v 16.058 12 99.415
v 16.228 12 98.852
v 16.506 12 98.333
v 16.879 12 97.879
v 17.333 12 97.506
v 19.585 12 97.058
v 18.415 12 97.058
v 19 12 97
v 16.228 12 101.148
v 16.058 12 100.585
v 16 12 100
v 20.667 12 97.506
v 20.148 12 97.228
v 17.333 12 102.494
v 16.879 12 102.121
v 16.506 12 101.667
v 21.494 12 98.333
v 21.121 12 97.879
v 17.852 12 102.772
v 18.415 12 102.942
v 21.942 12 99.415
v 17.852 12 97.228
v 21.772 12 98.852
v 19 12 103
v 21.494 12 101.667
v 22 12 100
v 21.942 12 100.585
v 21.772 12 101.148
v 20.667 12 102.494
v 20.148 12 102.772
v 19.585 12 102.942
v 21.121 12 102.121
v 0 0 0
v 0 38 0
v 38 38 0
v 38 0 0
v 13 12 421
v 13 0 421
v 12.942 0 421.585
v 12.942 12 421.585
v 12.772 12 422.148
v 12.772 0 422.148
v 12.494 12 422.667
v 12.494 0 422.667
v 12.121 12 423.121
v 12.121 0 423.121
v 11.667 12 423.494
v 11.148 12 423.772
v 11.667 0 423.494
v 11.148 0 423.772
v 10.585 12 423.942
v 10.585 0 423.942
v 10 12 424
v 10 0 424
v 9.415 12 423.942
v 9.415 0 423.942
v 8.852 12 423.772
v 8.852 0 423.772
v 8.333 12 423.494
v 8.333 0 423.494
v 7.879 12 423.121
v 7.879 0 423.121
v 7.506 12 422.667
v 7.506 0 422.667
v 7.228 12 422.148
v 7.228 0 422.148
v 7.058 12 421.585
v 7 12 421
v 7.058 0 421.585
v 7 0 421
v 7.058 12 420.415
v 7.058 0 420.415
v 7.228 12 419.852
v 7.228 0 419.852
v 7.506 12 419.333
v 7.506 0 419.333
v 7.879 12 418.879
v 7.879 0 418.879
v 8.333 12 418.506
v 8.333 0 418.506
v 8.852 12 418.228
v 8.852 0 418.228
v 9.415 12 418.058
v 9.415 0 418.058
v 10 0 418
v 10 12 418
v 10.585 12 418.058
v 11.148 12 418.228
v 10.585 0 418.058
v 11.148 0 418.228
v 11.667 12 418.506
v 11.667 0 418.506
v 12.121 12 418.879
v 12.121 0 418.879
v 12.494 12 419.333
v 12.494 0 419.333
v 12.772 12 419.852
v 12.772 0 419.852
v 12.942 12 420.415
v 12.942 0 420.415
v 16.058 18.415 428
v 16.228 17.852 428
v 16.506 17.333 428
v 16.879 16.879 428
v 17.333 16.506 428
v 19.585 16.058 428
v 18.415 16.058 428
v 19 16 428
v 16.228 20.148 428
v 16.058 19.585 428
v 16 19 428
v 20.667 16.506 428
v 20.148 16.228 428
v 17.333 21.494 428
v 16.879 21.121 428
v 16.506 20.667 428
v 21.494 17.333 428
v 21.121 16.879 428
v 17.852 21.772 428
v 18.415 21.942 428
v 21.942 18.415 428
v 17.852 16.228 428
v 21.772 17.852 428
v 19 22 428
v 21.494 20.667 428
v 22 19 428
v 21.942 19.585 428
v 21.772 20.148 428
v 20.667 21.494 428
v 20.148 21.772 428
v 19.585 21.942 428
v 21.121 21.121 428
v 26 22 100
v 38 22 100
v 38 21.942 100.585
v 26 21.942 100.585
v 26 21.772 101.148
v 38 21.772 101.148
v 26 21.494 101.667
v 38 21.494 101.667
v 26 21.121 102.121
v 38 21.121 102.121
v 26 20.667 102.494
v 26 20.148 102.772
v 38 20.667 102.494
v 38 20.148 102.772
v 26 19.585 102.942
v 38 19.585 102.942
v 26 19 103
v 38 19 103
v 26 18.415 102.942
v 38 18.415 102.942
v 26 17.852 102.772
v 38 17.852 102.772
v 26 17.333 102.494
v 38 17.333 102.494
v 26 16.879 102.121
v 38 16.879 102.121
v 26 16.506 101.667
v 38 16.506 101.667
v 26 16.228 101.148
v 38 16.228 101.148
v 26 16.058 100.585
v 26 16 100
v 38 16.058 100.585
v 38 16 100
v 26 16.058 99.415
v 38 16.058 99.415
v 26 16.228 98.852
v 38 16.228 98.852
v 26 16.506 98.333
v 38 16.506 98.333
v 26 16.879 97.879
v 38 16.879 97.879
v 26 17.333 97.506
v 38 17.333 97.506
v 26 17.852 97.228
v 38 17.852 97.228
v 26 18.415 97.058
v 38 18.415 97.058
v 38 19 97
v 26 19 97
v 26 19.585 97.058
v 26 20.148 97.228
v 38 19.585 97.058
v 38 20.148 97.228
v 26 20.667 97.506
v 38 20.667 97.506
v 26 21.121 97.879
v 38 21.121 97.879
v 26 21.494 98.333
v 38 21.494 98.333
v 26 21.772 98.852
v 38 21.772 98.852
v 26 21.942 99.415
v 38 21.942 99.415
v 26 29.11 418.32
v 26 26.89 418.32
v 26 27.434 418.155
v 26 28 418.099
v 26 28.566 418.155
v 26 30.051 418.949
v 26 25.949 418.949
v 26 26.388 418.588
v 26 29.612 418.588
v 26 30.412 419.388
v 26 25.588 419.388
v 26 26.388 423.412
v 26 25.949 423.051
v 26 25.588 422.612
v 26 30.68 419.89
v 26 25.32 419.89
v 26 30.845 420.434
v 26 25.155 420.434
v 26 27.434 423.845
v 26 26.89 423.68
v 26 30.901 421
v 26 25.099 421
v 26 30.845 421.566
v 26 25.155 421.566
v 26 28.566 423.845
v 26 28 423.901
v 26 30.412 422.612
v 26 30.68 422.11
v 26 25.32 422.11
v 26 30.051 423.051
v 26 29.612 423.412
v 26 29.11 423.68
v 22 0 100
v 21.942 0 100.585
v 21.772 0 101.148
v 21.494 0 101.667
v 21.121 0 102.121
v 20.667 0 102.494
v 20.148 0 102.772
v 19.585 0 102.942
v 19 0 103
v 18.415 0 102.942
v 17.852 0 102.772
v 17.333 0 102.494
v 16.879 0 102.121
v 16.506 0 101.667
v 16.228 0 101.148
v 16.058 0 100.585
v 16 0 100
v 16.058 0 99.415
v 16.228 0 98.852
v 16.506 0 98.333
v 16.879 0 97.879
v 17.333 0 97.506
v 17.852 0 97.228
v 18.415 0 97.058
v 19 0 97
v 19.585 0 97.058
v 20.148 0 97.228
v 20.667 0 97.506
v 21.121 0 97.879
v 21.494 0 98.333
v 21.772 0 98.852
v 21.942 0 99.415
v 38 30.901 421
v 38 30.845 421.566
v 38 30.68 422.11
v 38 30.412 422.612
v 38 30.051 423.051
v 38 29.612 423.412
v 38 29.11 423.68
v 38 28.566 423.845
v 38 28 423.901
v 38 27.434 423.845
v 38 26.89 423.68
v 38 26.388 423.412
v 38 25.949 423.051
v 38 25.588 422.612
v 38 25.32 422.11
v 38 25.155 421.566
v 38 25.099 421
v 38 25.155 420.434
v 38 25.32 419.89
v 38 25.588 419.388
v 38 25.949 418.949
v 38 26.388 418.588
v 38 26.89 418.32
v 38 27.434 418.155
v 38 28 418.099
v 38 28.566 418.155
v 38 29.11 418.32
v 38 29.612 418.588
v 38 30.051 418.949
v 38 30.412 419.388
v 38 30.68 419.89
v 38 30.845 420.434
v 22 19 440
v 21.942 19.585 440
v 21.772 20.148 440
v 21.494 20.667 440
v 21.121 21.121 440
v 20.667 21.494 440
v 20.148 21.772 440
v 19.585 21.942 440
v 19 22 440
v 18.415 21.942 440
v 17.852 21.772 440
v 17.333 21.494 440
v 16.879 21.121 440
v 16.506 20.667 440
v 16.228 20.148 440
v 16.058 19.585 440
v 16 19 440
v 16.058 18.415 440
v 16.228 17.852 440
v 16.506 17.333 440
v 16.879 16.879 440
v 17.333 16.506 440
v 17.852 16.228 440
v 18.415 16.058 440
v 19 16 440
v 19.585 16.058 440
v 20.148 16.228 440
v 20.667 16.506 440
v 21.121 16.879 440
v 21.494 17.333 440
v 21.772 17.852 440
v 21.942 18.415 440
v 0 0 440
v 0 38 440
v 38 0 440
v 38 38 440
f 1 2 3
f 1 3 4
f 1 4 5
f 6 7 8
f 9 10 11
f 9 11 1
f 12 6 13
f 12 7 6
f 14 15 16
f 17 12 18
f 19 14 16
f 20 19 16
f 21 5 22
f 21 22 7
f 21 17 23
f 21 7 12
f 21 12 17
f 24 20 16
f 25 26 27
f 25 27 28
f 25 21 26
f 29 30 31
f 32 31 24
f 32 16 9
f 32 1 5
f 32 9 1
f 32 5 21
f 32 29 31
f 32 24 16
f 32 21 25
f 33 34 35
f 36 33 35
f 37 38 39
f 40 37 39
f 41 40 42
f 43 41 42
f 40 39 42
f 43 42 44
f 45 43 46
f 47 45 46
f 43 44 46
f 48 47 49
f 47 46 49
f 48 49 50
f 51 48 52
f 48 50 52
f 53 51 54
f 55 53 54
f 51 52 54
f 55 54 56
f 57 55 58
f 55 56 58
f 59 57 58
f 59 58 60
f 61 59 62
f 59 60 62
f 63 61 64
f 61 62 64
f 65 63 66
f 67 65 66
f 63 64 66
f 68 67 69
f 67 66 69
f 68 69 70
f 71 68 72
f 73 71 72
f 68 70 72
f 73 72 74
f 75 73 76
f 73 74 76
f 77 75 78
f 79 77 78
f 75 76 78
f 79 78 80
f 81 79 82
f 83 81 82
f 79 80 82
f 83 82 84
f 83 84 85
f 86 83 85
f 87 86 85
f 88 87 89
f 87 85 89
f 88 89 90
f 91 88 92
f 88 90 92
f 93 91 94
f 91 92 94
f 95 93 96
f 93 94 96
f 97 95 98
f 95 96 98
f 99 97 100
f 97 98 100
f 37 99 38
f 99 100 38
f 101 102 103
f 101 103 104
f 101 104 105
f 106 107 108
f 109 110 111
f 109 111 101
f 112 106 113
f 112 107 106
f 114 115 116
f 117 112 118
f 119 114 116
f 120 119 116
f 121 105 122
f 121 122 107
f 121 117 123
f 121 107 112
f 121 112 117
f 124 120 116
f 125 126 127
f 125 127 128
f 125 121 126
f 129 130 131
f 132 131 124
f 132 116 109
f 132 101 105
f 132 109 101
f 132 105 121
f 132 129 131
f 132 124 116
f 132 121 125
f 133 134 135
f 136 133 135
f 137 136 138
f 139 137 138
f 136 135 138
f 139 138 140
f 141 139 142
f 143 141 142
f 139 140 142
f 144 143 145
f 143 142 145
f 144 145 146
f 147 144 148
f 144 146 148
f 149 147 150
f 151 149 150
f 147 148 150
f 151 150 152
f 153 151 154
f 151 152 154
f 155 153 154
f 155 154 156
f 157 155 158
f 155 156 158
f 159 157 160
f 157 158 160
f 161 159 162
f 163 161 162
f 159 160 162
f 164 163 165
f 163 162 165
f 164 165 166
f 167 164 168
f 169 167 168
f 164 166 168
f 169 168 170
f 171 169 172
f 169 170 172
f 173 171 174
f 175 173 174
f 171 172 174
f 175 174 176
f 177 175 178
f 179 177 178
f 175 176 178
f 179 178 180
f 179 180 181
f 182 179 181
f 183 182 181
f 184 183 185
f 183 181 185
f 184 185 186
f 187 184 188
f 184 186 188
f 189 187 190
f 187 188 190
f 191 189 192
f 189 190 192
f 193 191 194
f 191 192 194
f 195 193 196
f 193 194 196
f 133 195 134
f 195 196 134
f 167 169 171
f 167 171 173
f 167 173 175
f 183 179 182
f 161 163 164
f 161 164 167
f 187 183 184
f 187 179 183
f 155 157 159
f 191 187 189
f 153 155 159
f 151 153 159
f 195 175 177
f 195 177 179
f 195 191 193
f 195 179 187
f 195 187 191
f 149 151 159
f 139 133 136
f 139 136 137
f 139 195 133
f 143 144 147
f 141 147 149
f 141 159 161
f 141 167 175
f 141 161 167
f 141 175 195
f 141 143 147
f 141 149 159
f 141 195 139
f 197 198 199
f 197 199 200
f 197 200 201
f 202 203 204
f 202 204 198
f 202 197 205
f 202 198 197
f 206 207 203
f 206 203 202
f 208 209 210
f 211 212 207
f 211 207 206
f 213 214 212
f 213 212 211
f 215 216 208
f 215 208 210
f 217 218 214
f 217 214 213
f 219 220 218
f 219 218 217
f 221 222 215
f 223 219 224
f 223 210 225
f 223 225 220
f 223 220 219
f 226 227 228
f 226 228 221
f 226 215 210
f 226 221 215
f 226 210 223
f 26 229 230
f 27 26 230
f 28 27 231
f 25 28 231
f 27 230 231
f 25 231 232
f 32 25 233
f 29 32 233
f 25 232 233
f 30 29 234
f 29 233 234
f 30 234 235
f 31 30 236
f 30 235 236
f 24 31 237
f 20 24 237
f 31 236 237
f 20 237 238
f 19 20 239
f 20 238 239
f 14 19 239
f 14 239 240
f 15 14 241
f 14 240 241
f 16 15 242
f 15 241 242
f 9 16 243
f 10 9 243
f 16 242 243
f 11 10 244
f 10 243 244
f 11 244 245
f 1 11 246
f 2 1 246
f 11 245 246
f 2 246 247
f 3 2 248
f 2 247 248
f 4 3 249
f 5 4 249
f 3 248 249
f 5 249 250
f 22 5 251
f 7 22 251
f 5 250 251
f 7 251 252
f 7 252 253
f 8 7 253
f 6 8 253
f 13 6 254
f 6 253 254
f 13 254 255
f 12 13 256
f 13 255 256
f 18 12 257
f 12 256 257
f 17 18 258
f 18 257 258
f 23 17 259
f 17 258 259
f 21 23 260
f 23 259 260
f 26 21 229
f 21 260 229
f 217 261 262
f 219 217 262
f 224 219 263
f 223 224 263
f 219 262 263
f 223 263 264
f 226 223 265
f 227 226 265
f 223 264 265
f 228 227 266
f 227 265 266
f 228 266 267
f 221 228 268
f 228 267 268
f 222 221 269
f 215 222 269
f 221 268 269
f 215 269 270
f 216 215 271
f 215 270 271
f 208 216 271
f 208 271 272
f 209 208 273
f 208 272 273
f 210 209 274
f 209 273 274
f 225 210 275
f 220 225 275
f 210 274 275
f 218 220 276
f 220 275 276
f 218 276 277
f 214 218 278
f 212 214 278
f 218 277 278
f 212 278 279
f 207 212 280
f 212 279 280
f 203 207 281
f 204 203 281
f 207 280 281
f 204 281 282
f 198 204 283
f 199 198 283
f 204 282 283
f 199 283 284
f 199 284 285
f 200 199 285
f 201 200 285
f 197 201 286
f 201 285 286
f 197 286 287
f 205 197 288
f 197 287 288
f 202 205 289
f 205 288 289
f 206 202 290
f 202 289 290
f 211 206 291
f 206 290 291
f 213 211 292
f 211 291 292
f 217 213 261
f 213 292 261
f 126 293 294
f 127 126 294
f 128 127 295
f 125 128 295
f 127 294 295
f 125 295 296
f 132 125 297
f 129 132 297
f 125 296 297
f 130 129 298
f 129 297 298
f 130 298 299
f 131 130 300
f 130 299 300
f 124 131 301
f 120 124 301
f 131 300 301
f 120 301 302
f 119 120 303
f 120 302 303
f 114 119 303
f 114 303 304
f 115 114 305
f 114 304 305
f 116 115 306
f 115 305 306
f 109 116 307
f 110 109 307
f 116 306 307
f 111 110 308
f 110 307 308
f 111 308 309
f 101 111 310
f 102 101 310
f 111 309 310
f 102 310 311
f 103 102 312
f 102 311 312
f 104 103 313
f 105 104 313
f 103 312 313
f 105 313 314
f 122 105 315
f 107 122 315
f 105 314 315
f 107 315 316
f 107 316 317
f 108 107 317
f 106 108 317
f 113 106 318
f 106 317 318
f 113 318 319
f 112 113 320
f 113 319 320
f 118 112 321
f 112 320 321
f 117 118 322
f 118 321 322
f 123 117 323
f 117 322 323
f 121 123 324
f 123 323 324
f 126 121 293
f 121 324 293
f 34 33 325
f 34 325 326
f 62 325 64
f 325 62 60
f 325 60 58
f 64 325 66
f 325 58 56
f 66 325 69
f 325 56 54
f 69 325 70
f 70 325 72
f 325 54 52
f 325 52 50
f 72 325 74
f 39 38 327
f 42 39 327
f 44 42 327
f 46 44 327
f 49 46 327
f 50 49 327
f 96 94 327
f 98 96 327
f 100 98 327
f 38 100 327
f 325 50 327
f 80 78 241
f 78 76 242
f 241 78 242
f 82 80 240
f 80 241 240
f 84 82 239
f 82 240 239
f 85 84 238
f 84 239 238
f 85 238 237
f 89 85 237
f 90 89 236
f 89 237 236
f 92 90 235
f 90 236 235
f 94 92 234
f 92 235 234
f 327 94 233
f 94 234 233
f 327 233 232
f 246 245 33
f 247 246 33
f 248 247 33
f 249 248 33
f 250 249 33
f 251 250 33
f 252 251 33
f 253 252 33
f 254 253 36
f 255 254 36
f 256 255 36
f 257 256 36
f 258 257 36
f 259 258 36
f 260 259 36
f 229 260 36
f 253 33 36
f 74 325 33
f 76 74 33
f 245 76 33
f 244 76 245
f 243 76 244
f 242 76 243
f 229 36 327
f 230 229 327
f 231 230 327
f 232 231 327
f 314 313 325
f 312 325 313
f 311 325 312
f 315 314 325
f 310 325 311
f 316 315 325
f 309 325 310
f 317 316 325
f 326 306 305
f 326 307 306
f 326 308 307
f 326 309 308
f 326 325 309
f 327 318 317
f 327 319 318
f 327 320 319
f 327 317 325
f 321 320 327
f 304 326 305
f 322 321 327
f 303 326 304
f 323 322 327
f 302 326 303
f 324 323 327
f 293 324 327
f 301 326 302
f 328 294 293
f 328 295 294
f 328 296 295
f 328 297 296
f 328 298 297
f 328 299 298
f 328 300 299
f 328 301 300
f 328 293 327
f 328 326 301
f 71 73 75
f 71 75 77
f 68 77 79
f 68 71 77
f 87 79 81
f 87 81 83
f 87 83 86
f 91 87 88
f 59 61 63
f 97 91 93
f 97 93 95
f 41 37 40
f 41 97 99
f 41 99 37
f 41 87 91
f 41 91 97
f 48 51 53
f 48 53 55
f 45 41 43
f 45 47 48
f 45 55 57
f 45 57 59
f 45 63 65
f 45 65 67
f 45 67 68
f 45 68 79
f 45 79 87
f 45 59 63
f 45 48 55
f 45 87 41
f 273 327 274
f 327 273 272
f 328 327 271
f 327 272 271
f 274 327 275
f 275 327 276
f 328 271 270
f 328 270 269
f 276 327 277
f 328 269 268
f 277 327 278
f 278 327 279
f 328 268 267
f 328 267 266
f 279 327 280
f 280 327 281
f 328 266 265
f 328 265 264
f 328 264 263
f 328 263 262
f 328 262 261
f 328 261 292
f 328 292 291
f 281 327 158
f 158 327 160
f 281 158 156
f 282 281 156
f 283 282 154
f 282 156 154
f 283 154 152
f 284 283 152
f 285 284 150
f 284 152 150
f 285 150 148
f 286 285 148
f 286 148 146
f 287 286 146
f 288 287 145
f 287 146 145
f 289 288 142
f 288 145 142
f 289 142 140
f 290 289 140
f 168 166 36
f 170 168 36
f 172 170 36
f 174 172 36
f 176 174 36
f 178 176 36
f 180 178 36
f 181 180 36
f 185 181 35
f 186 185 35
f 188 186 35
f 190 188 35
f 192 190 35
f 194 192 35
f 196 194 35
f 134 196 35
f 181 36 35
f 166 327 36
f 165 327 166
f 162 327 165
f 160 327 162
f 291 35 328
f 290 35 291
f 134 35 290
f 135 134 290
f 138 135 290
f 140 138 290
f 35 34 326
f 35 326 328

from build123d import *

# Parameters (mm, degrees)
F0_W      = 38
F0_H      = 38
F1_DEPTH  = 440
F2_R      = 3
F3_DEPTH  = 12
F4_R      = 2.900994
F5_DEPTH  = 12
F6_R      = 3
F7_DEPTH  = 12
F8_R      = 3
F9_DEPTH  = 12
F10_R     = 3
F11_DEPTH = 12
F12_DEPTH = 12


with BuildPart() as f1:
    # F0 (on Top) → F1 (new body)
    with BuildSketch(Plane.XY):
        with Locations((19, 19)):
            Rectangle(F0_W, F0_H)
    extrude(amount=F1_DEPTH)

    # F2 (on face) → F3 (cut)
    with BuildSketch(Plane.XZ):
        with Locations((10, 421)):
            Circle(F2_R)
    extrude(amount=-F3_DEPTH, mode=Mode.SUBTRACT)

    # F4 (on face) → F5 (cut)
    with BuildSketch(Plane.YZ.offset(38)):
        with Locations((28, 421)):
            Circle(F4_R)
    extrude(amount=-F5_DEPTH, mode=Mode.SUBTRACT)

    # F6 (on face) → F7 (cut)
    with BuildSketch(Plane.XY.offset(440)):
        with Locations((19, 19)):
            Circle(F6_R)
    extrude(amount=-F7_DEPTH, mode=Mode.SUBTRACT)

    # F8 (on face) → F9 (cut)
    with BuildSketch(Plane.XZ):
        with Locations((19, 100)):
            Circle(F8_R)
    extrude(amount=-F9_DEPTH, mode=Mode.SUBTRACT)

    # F10 (on face) → F11 (cut)
    with BuildSketch(Plane.YZ.offset(38)):
        with Locations((19, 100)):
            Circle(F10_R)
    extrude(amount=-F11_DEPTH, mode=Mode.SUBTRACT)

    # F6 (on face) → F12 (cut)
    with BuildSketch(Plane.XY.offset(440)):
        with Locations((19, 19)):
            Circle(F6_R)
    extrude(amount=-F12_DEPTH, mode=Mode.SUBTRACT)


solid = f1.part
